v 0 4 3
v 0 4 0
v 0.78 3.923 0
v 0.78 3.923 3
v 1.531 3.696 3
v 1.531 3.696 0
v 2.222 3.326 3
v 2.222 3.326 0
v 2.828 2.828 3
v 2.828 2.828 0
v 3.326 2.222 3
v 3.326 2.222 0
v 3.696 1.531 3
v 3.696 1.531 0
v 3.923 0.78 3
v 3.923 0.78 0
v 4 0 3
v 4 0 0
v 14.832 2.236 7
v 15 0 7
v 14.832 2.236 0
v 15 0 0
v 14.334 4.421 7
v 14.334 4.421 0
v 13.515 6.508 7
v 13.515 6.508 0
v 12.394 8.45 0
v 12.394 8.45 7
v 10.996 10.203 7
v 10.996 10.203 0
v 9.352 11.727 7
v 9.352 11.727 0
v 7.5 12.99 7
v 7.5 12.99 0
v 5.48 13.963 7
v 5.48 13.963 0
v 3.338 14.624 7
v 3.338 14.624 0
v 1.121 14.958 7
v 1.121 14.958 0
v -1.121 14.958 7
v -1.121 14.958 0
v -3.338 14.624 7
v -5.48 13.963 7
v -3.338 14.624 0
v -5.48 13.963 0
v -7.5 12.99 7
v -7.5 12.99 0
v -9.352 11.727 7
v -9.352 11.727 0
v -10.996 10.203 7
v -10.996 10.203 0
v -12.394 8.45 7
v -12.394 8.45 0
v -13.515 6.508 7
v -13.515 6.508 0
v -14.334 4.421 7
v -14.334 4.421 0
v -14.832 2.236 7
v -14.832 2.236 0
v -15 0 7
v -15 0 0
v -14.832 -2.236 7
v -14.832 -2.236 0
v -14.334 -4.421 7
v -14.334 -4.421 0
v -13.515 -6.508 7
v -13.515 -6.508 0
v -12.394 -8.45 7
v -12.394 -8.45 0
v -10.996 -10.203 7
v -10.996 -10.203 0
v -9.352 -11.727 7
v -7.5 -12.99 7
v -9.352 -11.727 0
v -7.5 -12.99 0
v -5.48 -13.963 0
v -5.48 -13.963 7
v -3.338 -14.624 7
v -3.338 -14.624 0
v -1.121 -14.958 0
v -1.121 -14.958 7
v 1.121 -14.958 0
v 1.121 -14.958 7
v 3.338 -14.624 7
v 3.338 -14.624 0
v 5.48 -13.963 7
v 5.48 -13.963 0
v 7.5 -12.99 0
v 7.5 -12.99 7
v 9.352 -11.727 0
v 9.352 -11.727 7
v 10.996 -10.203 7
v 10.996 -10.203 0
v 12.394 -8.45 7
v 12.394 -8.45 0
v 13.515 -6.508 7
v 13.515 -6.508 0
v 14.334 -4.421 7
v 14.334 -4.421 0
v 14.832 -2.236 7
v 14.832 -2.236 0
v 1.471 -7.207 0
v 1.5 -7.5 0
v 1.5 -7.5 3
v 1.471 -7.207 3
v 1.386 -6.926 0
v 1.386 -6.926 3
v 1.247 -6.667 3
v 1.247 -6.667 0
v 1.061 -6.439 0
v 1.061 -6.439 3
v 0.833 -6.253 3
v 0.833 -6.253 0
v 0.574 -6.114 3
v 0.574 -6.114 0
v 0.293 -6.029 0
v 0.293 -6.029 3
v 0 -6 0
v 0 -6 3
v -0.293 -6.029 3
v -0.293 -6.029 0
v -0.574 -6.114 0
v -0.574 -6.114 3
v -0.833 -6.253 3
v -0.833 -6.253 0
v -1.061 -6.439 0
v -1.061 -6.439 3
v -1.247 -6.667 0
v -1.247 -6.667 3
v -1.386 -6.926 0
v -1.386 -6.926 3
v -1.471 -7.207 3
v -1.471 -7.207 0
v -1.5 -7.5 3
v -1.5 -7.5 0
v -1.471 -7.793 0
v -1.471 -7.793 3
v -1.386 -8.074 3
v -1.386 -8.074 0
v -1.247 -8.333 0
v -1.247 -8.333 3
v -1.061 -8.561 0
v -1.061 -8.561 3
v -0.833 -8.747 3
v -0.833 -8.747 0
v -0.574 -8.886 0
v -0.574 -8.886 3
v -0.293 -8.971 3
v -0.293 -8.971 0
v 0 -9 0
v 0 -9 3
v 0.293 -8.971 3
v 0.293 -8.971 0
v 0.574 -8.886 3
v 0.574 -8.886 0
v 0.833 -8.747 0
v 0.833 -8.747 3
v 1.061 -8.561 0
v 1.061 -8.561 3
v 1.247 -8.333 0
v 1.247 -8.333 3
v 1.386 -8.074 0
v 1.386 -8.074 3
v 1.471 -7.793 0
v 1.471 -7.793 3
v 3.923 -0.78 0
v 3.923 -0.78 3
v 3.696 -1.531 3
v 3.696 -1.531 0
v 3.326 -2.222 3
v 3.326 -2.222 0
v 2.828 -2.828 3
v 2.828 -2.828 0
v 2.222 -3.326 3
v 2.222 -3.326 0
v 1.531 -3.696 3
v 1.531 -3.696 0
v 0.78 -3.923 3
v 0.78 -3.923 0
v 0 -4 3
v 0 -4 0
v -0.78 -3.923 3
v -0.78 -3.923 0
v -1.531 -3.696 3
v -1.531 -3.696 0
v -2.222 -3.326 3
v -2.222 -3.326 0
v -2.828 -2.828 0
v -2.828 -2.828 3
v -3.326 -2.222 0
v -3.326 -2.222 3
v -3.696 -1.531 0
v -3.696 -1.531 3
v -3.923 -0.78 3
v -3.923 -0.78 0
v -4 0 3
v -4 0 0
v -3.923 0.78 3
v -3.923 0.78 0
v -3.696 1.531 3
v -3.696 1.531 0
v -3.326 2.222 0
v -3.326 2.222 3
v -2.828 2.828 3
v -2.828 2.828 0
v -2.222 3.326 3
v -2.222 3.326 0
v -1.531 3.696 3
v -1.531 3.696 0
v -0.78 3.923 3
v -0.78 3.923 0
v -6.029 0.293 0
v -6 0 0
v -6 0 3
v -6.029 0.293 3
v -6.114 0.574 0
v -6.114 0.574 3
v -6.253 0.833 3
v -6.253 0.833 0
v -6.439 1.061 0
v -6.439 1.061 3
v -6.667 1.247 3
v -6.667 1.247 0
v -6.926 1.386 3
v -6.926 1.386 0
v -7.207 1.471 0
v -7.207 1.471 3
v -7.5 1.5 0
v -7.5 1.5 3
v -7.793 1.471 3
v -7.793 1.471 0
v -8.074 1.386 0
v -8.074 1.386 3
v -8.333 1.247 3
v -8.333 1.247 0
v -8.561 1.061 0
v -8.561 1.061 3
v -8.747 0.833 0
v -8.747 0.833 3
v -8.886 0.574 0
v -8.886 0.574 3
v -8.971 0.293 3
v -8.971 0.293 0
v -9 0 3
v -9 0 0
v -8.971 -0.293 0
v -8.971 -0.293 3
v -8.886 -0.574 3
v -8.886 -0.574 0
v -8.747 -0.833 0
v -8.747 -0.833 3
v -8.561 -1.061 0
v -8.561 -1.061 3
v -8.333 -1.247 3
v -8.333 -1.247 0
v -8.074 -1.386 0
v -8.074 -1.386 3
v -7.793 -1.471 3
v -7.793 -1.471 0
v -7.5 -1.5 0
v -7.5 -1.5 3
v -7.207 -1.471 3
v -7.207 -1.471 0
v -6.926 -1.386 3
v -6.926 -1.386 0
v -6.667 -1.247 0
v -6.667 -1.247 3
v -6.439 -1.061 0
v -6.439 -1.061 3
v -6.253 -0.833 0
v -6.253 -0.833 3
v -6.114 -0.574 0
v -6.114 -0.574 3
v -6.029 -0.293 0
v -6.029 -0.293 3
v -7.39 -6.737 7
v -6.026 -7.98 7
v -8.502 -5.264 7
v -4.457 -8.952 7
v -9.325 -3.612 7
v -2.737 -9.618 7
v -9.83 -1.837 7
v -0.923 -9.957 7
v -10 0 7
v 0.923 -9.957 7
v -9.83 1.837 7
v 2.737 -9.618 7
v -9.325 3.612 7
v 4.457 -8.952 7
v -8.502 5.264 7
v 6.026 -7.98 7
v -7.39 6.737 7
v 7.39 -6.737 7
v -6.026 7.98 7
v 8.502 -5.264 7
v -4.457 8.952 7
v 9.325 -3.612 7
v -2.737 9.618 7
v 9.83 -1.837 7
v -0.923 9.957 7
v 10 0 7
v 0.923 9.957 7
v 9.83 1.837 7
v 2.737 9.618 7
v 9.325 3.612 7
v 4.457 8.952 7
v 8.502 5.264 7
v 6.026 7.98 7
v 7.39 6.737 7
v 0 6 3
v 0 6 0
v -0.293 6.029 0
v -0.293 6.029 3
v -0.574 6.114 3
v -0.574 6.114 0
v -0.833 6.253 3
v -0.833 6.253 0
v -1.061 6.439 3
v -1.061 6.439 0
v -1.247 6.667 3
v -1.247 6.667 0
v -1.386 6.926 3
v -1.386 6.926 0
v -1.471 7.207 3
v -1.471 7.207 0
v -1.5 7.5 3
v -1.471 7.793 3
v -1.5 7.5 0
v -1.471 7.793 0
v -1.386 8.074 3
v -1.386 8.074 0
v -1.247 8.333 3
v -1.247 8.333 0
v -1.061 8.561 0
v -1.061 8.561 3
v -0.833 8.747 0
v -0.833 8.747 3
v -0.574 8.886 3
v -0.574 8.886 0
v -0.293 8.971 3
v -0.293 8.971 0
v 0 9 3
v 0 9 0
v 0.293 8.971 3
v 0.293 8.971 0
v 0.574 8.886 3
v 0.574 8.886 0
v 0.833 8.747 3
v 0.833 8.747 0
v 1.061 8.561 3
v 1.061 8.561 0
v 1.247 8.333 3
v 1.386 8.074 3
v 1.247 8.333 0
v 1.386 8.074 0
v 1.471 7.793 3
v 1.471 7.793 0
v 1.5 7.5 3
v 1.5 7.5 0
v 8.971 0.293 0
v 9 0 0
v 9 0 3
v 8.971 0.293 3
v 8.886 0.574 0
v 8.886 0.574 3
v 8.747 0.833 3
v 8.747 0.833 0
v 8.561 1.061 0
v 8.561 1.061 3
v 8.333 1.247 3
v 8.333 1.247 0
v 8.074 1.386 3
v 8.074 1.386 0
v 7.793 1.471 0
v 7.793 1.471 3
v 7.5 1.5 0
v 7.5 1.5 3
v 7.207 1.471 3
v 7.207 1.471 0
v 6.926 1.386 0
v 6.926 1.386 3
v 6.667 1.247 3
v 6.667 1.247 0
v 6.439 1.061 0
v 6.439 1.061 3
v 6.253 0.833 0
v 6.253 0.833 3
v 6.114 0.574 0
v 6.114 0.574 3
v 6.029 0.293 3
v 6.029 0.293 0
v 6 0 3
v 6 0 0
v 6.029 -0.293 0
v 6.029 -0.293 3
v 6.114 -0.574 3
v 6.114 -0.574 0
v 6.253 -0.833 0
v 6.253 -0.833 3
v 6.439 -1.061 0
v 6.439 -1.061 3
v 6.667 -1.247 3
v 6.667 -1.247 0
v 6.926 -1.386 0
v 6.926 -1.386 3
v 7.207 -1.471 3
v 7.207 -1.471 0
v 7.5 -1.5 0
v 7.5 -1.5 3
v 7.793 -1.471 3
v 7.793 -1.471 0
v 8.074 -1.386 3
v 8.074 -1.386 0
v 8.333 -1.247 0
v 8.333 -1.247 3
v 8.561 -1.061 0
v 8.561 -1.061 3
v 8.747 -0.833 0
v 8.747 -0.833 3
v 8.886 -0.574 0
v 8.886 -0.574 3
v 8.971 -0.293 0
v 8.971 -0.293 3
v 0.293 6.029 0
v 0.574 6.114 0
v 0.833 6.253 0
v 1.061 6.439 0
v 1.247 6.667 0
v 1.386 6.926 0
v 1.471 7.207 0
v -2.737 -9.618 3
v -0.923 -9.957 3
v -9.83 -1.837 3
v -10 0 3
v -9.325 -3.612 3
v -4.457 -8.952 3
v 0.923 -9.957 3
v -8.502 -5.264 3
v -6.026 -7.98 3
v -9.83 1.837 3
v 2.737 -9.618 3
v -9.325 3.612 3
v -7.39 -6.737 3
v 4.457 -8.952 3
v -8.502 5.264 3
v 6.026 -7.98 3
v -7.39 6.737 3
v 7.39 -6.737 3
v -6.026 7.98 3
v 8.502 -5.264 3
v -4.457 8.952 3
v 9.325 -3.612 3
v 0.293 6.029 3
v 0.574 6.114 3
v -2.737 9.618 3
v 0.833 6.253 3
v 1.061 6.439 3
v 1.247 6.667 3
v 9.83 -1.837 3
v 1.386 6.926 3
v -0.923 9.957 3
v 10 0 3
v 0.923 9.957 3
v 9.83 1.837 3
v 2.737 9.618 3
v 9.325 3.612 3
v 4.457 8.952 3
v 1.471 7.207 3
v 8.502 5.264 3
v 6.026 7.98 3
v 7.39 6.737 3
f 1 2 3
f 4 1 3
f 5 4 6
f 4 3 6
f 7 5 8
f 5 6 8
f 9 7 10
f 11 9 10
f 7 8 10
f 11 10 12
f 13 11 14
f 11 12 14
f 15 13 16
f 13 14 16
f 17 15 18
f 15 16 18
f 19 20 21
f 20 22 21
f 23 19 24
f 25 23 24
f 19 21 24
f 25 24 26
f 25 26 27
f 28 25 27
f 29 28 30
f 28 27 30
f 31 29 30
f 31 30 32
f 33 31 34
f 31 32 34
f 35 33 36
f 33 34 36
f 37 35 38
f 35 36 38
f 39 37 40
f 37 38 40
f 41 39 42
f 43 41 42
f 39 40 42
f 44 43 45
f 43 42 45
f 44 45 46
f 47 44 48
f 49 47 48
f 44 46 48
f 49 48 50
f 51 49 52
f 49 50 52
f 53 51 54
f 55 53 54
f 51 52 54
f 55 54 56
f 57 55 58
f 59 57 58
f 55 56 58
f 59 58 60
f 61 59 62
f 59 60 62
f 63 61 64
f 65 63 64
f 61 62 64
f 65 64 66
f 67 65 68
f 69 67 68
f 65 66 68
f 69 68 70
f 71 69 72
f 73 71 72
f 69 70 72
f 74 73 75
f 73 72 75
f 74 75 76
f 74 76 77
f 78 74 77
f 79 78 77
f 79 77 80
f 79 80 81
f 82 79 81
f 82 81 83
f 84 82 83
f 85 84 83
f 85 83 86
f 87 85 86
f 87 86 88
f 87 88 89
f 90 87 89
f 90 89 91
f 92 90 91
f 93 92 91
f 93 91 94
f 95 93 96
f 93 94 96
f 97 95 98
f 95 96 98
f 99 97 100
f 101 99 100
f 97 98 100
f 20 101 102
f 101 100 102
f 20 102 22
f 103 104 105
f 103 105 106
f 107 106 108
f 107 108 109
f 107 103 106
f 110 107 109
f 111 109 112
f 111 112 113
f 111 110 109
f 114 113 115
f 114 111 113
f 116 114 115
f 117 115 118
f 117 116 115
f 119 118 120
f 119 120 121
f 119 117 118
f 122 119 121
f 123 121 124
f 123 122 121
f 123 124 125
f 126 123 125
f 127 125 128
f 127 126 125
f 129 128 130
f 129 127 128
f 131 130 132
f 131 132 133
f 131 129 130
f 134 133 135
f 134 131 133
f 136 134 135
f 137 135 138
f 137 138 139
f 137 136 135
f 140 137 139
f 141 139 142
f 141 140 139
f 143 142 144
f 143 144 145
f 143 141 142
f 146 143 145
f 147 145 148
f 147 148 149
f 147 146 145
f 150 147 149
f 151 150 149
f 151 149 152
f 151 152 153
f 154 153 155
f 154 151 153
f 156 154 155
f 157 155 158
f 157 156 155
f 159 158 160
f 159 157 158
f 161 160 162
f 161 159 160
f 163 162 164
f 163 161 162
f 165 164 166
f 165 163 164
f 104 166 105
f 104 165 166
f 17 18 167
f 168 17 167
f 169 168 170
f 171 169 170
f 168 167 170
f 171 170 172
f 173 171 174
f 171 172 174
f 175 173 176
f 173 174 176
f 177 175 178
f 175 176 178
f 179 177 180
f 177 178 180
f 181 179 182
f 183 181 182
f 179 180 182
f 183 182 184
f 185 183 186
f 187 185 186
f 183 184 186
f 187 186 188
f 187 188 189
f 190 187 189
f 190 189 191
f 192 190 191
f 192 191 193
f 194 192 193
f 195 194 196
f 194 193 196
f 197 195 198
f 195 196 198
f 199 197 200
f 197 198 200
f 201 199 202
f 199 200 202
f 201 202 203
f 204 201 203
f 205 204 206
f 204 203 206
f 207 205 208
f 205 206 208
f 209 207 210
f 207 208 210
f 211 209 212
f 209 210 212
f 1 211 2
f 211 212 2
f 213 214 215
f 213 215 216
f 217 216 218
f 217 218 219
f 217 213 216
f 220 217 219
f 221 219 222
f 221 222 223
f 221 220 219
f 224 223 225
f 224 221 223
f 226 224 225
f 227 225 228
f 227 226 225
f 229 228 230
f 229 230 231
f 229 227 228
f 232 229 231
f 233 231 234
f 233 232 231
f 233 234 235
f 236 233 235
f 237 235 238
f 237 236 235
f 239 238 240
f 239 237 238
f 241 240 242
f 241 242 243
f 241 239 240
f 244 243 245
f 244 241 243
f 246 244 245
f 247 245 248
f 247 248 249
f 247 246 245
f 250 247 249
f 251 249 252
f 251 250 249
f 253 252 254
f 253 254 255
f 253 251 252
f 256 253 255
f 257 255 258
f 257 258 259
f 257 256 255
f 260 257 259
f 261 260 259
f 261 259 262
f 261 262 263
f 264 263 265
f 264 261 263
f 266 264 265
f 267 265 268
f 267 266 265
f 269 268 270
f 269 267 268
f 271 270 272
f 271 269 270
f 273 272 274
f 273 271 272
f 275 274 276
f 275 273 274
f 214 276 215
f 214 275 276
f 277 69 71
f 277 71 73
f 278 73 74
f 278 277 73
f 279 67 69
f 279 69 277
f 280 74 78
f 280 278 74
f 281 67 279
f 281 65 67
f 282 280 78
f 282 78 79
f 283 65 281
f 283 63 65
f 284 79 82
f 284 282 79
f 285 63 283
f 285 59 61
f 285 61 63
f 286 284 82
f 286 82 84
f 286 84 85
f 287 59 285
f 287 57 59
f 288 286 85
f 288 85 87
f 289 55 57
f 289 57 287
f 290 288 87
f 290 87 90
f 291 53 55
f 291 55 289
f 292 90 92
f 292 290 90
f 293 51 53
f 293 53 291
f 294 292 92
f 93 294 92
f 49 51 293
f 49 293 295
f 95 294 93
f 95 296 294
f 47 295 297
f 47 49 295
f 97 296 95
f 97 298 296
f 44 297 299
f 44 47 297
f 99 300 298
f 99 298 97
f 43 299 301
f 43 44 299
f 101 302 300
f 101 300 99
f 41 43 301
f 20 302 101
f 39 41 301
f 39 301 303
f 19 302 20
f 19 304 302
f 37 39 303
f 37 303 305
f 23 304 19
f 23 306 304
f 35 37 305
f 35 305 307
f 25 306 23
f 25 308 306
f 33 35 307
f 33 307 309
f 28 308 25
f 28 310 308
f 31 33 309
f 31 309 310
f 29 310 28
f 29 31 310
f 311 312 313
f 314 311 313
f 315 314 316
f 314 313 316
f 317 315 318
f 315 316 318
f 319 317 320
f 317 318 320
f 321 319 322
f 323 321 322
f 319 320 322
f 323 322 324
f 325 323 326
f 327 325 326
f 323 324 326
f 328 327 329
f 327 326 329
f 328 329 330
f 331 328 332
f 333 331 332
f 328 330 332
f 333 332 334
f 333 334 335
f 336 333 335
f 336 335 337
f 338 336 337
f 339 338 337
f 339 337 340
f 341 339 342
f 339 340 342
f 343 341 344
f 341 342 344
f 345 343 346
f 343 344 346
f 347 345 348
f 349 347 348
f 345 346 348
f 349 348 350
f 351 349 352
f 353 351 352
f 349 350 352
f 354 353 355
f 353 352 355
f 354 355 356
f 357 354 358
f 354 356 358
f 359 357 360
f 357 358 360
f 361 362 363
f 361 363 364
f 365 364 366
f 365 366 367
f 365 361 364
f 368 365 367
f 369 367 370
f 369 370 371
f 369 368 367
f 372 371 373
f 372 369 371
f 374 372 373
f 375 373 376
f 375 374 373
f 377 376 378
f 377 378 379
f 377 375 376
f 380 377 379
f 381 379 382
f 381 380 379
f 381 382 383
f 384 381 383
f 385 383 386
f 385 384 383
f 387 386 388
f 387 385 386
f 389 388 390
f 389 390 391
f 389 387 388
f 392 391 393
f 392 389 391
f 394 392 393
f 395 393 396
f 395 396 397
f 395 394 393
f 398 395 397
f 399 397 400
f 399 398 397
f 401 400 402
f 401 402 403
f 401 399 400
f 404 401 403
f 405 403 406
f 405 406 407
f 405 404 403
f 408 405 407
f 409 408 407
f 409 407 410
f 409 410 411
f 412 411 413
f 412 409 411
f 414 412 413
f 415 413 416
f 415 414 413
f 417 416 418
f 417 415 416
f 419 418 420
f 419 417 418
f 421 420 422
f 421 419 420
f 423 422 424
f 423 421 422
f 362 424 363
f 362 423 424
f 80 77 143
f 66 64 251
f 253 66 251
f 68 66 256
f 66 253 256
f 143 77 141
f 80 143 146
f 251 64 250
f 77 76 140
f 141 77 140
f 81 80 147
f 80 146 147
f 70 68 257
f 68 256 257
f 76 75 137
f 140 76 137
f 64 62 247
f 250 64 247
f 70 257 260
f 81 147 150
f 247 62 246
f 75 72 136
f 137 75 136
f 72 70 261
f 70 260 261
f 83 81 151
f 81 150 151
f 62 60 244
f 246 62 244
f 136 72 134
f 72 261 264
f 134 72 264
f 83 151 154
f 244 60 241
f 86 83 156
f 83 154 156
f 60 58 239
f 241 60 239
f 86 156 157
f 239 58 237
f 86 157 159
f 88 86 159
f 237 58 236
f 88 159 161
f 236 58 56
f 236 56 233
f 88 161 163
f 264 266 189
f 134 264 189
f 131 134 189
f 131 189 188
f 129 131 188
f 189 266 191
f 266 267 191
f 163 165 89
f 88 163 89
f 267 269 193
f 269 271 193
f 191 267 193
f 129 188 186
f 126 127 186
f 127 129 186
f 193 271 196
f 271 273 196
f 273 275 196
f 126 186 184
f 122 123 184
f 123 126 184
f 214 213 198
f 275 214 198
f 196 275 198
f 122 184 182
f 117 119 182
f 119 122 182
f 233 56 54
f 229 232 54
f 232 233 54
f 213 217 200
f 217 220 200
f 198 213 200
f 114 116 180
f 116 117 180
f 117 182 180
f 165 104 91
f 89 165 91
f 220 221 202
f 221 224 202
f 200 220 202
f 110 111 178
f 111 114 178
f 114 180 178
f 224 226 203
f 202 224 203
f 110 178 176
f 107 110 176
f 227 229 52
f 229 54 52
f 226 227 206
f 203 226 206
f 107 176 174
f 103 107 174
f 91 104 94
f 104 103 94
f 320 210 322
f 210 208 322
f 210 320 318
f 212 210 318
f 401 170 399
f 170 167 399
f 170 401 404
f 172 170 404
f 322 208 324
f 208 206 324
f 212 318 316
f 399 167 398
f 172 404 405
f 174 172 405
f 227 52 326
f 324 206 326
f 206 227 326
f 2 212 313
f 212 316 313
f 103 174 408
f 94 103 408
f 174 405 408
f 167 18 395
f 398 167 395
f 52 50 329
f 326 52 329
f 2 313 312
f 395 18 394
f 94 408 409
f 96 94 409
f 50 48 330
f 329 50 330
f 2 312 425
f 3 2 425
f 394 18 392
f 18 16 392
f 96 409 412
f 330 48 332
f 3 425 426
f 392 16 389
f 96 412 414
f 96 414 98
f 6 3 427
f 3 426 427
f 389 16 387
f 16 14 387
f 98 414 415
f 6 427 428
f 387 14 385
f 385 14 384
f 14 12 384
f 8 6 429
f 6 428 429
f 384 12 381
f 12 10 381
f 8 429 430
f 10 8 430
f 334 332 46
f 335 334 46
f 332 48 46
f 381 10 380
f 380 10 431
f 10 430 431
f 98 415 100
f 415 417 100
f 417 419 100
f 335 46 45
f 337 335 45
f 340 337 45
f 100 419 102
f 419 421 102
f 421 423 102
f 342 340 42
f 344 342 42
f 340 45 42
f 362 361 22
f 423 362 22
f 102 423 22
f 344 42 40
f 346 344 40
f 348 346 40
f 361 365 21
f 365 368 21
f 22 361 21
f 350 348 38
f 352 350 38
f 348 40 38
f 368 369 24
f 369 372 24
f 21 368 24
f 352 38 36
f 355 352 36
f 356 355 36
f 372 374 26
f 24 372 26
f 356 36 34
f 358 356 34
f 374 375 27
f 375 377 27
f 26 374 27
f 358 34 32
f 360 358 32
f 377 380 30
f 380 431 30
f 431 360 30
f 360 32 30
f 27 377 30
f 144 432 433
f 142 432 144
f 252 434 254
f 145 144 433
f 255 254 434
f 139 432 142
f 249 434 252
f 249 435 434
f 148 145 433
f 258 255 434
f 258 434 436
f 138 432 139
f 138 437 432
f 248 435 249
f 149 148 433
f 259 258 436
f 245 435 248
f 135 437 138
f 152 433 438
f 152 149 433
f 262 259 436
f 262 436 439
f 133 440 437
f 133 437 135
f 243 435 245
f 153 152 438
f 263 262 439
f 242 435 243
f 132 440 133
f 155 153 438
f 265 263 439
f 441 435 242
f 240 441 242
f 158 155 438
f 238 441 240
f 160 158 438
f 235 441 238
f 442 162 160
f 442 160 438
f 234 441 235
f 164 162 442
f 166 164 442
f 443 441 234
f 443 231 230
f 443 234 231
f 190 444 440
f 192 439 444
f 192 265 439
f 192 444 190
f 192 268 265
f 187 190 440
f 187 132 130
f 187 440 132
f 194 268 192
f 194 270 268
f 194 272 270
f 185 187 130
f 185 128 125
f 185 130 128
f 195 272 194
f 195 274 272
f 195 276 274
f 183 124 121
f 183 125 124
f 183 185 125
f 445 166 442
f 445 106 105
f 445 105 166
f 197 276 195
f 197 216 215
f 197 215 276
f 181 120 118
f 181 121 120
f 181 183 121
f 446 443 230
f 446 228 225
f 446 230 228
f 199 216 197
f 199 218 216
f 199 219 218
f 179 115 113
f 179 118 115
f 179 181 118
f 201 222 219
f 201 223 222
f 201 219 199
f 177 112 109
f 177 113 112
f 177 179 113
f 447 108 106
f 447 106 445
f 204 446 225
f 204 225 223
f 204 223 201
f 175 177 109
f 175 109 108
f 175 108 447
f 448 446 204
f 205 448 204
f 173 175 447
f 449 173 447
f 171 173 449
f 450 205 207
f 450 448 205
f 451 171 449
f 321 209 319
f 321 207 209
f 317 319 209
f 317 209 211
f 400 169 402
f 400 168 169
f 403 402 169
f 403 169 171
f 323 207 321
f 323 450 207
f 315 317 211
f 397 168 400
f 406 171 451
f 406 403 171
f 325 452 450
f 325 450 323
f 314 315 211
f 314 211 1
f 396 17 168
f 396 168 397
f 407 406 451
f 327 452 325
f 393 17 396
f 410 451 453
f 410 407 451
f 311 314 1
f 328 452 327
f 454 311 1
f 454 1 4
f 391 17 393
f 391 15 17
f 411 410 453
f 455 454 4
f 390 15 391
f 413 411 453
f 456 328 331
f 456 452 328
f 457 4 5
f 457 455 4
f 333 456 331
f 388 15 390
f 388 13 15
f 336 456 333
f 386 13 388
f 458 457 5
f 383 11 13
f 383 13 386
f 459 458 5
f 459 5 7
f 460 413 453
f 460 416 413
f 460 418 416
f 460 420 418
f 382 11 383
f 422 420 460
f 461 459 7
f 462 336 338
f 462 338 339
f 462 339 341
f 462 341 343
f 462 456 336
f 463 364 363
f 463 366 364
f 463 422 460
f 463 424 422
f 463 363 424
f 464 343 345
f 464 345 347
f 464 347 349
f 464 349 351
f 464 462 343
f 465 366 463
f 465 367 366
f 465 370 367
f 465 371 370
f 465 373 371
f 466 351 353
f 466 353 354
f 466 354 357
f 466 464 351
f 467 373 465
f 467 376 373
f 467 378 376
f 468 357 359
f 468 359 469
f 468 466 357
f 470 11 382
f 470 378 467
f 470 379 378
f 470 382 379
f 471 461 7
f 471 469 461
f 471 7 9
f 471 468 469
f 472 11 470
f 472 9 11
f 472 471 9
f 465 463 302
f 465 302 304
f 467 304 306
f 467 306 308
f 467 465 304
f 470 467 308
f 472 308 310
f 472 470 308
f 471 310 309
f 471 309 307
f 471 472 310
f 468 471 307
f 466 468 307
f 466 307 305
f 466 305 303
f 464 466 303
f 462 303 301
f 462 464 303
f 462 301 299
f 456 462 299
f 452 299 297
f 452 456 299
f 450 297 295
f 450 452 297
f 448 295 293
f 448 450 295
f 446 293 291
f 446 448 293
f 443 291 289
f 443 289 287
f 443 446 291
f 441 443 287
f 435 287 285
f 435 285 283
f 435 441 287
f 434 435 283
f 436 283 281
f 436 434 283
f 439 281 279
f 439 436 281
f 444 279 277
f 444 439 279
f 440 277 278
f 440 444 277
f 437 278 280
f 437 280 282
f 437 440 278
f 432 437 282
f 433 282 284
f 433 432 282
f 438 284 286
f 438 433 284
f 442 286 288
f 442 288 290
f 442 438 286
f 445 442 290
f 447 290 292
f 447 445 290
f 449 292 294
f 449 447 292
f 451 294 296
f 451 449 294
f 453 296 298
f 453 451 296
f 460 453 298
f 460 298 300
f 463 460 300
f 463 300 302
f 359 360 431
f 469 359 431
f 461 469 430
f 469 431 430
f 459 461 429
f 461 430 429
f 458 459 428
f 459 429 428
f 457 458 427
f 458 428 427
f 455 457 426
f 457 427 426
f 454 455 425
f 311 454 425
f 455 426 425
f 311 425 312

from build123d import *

# Parameters (mm, degrees)
F0_R     = 15
F0_R_2   = 1.5
F1_DEPTH = 3
F2_R     = 15
F2_R_2   = 10
F3_DEPTH = 4


with BuildPart() as f1:
    # F0 (on Top) → F1 (new body)
    with BuildSketch(Plane.XY):
        Circle(F0_R)
        with Locations((0, -7.5)):
            Circle(F0_R_2, mode=Mode.SUBTRACT)
        with Locations((-7.5, 0)):
            Circle(F0_R_2, mode=Mode.SUBTRACT)
        with BuildLine():
            ThreePointArc((4, 0), (-2.8284271247, -2.8284271247), (0, 4))
            ThreePointArc((0, 4), (2.8284271247, 2.8284271247), (4, 0))
        make_face(mode=Mode.SUBTRACT)
        with Locations((7.5, 0)):
            Circle(F0_R_2, mode=Mode.SUBTRACT)
        with BuildLine():
            ThreePointArc((1.5, 7.5), (1.0606601718, 6.4393398282), (0, 6))
            ThreePointArc((0, 6), (-1.0606601718, 8.5606601718), (1.5, 7.5))
        make_face(mode=Mode.SUBTRACT)
    extrude(amount=F1_DEPTH)

    # F2 (on face) → F3 (join)
    with BuildSketch(Plane.XY.offset(3)):
        Circle(F2_R)
        Circle(F2_R_2, mode=Mode.SUBTRACT)
    extrude(amount=F3_DEPTH)


solid = f1.part
